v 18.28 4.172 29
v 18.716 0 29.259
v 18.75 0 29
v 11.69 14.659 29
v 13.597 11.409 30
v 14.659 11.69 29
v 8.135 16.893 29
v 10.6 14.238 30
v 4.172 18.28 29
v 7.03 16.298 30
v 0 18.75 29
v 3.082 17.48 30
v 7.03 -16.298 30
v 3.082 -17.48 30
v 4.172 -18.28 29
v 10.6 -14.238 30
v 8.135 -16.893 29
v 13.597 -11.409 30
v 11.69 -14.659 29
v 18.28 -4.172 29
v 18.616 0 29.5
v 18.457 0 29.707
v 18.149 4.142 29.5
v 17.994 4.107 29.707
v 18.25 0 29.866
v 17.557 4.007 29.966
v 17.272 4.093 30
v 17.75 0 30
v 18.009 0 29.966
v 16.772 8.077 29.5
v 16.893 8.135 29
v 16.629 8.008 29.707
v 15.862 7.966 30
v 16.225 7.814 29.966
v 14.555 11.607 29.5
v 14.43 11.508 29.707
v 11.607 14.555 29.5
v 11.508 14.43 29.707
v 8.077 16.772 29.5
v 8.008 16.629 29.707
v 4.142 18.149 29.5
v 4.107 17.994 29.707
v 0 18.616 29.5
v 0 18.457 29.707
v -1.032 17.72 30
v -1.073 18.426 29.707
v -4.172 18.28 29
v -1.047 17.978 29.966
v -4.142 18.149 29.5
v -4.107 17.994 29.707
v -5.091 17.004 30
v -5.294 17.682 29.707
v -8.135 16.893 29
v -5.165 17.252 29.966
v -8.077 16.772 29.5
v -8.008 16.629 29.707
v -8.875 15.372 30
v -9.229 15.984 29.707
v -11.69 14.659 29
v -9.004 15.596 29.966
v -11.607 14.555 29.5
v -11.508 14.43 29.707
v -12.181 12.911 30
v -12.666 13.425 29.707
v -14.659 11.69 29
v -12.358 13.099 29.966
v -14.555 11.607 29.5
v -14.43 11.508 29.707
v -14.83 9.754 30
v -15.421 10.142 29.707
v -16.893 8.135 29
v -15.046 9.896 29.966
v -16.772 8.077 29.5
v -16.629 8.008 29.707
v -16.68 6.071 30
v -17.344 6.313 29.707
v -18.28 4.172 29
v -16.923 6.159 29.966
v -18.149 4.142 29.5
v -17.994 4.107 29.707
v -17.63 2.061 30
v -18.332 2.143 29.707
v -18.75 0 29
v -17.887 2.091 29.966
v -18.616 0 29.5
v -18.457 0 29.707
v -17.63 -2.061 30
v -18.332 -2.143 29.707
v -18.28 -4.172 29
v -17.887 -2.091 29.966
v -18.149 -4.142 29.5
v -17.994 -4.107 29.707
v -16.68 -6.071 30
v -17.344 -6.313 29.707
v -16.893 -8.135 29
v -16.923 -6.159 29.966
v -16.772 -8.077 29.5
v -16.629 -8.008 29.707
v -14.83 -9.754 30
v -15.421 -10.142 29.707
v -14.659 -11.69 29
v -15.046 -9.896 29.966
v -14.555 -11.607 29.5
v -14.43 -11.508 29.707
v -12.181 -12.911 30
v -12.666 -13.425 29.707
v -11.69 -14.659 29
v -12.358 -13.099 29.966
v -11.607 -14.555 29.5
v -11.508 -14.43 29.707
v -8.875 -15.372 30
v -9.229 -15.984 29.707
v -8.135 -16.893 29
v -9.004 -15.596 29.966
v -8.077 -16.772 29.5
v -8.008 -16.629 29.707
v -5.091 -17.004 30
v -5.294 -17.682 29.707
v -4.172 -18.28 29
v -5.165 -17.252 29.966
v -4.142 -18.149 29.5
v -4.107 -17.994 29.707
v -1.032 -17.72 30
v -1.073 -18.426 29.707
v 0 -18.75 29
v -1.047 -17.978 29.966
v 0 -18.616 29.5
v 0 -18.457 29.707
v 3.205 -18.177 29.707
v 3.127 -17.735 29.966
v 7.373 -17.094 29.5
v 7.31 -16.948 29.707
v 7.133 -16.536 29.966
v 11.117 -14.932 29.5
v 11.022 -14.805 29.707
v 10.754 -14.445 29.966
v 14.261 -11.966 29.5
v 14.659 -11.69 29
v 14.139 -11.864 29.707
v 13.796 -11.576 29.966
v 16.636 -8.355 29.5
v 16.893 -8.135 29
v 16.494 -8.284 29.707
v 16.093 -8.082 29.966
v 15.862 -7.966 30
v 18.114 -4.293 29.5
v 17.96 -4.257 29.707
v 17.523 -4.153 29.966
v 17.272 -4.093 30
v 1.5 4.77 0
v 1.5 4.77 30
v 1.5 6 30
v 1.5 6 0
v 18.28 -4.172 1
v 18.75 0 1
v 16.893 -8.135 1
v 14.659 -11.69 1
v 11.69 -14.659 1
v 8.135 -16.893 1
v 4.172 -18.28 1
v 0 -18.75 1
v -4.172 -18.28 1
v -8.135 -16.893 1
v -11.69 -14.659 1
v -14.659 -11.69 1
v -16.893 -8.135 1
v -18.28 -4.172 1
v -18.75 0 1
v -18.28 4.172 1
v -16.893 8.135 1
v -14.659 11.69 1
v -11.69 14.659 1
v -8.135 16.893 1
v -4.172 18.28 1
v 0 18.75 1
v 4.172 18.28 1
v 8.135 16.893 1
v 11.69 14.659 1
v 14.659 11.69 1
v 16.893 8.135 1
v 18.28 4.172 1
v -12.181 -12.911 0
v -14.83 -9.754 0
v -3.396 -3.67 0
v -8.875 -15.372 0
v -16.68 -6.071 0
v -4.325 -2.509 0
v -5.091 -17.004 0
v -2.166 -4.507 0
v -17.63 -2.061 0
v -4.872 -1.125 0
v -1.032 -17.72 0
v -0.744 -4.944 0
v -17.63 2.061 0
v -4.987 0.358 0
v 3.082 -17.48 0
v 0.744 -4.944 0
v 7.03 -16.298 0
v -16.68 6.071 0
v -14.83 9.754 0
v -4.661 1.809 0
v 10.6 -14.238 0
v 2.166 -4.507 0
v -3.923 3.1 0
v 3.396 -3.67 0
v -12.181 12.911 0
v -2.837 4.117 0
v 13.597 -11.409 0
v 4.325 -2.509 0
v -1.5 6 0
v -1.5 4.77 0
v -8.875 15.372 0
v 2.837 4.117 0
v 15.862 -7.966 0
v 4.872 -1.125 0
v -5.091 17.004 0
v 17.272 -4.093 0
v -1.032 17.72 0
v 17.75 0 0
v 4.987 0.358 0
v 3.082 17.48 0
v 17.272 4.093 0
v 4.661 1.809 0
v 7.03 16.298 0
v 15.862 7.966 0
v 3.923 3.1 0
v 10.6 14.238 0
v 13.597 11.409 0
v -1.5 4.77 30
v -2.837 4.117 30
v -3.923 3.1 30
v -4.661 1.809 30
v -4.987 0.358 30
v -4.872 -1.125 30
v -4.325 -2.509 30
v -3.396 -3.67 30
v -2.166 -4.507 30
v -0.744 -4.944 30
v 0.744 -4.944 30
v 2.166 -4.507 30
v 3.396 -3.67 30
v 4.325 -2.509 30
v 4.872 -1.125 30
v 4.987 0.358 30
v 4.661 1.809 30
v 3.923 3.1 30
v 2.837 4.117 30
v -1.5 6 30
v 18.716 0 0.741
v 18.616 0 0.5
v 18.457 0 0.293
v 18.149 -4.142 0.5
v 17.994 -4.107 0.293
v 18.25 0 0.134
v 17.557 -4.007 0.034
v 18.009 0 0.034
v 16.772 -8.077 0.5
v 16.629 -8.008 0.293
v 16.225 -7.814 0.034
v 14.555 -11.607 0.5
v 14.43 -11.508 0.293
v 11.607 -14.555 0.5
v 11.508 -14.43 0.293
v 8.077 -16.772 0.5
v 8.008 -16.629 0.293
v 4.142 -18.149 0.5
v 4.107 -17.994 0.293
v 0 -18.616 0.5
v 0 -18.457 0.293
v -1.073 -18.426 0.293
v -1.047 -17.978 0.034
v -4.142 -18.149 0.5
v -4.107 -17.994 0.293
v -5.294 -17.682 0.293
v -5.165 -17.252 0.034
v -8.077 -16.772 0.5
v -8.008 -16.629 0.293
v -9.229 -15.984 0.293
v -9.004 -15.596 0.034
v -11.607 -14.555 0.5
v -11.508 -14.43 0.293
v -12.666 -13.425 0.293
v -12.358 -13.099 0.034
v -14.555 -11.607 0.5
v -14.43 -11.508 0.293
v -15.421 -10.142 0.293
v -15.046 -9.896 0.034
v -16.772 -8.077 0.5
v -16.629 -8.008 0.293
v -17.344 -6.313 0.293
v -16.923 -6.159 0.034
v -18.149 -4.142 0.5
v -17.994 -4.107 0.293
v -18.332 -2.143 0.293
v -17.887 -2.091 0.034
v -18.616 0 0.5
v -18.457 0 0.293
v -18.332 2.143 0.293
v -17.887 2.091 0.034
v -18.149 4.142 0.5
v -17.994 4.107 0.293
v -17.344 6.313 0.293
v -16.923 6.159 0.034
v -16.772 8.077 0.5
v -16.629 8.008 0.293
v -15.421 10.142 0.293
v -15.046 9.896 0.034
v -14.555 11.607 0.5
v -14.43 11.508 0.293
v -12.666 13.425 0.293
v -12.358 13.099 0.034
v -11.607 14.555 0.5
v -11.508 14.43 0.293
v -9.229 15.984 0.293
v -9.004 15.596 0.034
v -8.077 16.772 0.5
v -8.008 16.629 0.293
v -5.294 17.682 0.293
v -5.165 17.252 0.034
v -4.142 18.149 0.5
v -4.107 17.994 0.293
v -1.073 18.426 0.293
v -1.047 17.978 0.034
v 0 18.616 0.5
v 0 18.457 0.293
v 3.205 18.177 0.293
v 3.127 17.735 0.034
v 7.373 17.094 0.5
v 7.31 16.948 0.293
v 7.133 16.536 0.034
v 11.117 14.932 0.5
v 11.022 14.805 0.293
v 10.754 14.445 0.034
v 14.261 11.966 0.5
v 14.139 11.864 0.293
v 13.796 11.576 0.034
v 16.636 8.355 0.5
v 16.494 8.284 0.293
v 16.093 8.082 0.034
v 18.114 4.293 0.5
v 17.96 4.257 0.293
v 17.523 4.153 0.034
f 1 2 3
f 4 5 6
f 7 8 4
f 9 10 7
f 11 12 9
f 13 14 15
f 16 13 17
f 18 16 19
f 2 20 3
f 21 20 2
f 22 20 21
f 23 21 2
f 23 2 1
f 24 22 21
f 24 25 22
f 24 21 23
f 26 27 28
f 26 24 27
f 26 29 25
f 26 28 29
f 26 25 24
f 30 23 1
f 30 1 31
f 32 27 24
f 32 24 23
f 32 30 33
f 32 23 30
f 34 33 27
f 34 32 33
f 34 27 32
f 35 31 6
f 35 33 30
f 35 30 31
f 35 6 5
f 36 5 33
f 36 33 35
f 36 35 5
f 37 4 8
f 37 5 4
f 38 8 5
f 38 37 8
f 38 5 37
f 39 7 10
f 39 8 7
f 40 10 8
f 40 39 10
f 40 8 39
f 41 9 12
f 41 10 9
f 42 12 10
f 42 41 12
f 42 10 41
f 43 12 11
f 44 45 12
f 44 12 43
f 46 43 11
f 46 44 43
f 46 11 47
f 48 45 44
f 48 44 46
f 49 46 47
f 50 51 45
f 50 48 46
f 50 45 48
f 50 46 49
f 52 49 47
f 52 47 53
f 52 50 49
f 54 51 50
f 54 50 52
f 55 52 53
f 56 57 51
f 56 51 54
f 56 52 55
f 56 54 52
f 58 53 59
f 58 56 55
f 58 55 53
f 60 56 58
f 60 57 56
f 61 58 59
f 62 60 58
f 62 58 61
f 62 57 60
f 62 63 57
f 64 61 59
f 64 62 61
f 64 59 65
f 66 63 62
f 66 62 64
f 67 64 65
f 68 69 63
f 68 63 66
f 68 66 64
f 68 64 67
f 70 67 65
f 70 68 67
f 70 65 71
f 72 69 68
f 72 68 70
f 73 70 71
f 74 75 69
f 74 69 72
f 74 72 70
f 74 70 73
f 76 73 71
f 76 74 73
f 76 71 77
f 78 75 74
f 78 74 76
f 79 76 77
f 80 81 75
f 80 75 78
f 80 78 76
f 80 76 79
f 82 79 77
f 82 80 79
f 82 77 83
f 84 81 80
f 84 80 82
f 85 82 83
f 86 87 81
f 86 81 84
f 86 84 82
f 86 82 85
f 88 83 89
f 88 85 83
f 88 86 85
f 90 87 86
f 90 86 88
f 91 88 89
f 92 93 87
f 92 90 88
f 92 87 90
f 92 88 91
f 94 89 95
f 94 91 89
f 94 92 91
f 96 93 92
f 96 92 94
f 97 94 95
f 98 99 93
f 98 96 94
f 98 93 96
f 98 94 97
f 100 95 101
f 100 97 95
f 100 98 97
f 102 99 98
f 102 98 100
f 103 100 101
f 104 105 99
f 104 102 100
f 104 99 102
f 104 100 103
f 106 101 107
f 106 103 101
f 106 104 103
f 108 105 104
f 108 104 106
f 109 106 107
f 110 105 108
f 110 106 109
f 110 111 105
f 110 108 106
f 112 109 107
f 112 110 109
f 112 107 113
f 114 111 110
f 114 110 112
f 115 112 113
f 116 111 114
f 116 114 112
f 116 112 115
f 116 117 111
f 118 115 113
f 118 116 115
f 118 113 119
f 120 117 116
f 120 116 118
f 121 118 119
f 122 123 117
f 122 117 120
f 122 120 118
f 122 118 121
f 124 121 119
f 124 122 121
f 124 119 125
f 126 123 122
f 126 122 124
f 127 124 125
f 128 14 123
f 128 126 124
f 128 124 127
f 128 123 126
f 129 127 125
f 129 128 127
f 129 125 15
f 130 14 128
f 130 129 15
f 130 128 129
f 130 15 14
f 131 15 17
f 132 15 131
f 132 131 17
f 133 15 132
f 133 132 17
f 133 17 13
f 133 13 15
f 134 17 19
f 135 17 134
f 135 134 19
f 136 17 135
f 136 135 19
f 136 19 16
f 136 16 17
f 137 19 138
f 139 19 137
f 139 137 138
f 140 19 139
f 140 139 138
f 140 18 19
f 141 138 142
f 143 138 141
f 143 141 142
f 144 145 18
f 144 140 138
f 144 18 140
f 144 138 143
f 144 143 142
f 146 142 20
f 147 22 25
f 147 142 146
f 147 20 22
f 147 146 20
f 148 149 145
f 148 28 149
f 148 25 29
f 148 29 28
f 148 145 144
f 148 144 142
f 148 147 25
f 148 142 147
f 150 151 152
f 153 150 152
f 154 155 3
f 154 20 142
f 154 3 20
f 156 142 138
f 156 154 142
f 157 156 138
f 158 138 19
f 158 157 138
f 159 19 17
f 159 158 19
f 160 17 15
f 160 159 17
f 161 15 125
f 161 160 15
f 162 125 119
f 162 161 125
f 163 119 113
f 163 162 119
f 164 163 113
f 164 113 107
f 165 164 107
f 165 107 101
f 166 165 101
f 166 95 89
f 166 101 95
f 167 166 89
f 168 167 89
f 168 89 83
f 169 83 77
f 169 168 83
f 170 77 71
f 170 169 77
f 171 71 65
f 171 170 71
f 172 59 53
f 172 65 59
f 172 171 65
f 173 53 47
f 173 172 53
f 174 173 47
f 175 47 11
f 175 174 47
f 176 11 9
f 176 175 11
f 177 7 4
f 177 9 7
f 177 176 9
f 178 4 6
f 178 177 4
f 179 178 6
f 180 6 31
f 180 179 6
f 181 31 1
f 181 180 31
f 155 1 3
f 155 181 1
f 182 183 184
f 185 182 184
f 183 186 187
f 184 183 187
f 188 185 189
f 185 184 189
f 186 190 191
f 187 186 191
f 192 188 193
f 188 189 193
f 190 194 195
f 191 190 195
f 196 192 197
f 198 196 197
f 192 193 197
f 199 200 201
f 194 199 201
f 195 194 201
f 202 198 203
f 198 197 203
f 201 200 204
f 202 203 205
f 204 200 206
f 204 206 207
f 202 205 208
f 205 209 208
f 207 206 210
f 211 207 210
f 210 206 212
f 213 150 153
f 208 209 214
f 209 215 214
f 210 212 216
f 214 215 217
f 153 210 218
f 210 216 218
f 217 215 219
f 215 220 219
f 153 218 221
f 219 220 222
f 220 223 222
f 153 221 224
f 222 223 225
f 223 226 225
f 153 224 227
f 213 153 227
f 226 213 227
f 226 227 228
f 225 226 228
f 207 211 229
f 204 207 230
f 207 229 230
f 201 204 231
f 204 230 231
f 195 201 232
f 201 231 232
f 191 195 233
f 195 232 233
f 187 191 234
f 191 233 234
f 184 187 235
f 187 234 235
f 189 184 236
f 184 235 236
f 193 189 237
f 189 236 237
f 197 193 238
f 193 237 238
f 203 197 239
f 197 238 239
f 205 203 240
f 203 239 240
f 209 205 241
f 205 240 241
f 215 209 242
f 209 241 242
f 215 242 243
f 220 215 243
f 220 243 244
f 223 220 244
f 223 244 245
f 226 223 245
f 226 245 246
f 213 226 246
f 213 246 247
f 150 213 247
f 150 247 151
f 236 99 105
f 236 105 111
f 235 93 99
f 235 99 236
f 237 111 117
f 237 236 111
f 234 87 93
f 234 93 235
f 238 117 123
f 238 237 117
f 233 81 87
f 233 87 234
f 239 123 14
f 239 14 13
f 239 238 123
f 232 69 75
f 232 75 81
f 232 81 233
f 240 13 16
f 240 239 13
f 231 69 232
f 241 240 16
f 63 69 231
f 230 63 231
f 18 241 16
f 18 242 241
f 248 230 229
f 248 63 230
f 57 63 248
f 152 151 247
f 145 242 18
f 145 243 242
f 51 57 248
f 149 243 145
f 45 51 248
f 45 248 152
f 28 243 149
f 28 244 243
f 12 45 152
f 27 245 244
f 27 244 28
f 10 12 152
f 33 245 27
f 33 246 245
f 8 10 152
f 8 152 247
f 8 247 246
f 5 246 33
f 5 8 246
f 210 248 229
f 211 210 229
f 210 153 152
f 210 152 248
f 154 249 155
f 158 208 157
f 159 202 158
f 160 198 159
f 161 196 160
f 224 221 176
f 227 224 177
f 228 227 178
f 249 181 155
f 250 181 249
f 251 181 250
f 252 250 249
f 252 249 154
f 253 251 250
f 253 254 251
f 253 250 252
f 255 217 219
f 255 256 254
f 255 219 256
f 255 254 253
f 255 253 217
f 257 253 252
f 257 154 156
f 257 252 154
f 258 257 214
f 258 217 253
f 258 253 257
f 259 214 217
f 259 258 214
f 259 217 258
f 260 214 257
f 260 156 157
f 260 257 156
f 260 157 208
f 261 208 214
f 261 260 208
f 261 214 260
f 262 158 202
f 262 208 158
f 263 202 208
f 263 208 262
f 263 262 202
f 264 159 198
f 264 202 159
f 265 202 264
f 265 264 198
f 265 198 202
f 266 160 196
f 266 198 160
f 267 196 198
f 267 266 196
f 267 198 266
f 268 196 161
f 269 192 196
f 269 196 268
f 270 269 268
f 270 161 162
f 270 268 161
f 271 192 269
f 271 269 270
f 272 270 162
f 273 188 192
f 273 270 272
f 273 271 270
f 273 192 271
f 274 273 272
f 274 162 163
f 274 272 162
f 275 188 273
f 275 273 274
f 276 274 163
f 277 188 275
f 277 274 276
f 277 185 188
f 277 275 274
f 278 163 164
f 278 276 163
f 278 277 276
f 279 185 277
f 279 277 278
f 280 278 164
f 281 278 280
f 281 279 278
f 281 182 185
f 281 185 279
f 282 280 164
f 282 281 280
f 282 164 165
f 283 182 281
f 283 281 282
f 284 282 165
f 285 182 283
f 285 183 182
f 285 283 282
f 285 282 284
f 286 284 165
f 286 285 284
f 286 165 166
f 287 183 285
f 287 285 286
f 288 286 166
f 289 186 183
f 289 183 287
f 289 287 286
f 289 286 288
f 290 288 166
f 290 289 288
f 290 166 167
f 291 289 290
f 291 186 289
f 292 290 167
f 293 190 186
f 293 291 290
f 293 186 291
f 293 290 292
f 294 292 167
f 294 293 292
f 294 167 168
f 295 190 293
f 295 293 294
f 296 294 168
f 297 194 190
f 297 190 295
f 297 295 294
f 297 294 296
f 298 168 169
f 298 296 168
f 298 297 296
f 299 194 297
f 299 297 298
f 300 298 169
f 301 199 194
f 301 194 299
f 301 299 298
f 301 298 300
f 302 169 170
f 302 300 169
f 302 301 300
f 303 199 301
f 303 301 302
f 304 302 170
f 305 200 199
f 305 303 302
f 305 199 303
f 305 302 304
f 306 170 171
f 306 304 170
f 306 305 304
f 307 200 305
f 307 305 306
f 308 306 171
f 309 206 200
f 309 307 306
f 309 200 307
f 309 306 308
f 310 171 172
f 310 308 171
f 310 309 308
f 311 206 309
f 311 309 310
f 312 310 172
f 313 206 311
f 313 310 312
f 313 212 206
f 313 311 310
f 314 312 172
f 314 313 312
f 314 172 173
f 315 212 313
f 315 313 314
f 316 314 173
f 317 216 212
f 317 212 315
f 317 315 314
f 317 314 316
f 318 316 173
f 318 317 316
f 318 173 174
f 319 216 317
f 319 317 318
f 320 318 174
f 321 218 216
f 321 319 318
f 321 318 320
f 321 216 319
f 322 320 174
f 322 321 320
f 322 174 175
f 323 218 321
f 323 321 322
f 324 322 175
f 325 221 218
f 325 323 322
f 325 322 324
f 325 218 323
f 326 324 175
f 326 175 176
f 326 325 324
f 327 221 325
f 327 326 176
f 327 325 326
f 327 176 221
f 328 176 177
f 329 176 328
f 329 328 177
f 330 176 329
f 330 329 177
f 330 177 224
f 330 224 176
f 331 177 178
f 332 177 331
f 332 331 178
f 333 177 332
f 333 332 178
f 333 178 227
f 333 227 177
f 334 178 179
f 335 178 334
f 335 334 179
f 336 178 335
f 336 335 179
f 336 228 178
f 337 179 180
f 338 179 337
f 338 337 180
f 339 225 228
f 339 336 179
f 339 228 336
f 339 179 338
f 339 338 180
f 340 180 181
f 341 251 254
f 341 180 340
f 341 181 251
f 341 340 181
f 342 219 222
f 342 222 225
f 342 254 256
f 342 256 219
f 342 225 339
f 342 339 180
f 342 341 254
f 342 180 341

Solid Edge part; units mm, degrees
sketch "Sketch1" plane through (0, 0, 0) normal (0, 0, 1) x (1, 0, 0)
  circle A0 centre (0, 0) radius 18.75
  dimension "D1" = 37.5
extrude "Protrusion1" add sketch "Sketch1" along normal blind 30
sketch "Sketch2" plane through (0, 0, 30) normal (0, 0, 1) x (1, 0, 0)
  circle A0 centre (0, 0) radius 5
  line L0 (-1.5, 4) -> (1.5, 4)
  line L1 (1.5, 4) -> (1.5, 6)
  line L2 (1.5, 6) -> (-1.5, 6)
  line L3 (-1.5, 6) -> (-1.5, 4)
  dimension "D1" = 10
  dimension "D2" = 3
  dimension "D3" = 2
extrude "Cutout1" cut sketch "Sketch2" against normal through all
fillet "Round_1" radius 1 2 edges at (-18.75, 0, 30) (-18.75, 0, 0)
properties material "Stainless steel"
